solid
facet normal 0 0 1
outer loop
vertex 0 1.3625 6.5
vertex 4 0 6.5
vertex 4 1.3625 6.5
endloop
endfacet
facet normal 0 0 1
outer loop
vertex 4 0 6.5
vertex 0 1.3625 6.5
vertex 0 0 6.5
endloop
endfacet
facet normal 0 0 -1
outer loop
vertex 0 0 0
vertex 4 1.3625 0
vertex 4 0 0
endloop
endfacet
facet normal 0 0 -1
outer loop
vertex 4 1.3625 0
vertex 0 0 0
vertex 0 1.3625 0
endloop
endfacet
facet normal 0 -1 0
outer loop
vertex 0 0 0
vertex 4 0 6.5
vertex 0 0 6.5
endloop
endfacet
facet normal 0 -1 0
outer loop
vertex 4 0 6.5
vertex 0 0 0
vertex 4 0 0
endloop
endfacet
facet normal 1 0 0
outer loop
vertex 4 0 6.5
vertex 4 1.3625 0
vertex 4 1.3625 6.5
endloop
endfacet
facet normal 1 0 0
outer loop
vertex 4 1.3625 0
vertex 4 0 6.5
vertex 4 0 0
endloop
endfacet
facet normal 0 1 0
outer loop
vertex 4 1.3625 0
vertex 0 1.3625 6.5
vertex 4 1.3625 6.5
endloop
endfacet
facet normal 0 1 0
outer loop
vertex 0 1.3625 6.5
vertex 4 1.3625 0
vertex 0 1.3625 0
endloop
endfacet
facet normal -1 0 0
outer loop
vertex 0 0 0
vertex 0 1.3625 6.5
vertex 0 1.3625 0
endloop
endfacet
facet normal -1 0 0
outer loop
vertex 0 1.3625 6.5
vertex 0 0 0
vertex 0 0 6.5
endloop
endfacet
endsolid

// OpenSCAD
// Generated by SolidPython 1.0.4 on 2021-01-20 11:14:16


cube(size = [4, 1.3625000000, 6.5000000000]);
